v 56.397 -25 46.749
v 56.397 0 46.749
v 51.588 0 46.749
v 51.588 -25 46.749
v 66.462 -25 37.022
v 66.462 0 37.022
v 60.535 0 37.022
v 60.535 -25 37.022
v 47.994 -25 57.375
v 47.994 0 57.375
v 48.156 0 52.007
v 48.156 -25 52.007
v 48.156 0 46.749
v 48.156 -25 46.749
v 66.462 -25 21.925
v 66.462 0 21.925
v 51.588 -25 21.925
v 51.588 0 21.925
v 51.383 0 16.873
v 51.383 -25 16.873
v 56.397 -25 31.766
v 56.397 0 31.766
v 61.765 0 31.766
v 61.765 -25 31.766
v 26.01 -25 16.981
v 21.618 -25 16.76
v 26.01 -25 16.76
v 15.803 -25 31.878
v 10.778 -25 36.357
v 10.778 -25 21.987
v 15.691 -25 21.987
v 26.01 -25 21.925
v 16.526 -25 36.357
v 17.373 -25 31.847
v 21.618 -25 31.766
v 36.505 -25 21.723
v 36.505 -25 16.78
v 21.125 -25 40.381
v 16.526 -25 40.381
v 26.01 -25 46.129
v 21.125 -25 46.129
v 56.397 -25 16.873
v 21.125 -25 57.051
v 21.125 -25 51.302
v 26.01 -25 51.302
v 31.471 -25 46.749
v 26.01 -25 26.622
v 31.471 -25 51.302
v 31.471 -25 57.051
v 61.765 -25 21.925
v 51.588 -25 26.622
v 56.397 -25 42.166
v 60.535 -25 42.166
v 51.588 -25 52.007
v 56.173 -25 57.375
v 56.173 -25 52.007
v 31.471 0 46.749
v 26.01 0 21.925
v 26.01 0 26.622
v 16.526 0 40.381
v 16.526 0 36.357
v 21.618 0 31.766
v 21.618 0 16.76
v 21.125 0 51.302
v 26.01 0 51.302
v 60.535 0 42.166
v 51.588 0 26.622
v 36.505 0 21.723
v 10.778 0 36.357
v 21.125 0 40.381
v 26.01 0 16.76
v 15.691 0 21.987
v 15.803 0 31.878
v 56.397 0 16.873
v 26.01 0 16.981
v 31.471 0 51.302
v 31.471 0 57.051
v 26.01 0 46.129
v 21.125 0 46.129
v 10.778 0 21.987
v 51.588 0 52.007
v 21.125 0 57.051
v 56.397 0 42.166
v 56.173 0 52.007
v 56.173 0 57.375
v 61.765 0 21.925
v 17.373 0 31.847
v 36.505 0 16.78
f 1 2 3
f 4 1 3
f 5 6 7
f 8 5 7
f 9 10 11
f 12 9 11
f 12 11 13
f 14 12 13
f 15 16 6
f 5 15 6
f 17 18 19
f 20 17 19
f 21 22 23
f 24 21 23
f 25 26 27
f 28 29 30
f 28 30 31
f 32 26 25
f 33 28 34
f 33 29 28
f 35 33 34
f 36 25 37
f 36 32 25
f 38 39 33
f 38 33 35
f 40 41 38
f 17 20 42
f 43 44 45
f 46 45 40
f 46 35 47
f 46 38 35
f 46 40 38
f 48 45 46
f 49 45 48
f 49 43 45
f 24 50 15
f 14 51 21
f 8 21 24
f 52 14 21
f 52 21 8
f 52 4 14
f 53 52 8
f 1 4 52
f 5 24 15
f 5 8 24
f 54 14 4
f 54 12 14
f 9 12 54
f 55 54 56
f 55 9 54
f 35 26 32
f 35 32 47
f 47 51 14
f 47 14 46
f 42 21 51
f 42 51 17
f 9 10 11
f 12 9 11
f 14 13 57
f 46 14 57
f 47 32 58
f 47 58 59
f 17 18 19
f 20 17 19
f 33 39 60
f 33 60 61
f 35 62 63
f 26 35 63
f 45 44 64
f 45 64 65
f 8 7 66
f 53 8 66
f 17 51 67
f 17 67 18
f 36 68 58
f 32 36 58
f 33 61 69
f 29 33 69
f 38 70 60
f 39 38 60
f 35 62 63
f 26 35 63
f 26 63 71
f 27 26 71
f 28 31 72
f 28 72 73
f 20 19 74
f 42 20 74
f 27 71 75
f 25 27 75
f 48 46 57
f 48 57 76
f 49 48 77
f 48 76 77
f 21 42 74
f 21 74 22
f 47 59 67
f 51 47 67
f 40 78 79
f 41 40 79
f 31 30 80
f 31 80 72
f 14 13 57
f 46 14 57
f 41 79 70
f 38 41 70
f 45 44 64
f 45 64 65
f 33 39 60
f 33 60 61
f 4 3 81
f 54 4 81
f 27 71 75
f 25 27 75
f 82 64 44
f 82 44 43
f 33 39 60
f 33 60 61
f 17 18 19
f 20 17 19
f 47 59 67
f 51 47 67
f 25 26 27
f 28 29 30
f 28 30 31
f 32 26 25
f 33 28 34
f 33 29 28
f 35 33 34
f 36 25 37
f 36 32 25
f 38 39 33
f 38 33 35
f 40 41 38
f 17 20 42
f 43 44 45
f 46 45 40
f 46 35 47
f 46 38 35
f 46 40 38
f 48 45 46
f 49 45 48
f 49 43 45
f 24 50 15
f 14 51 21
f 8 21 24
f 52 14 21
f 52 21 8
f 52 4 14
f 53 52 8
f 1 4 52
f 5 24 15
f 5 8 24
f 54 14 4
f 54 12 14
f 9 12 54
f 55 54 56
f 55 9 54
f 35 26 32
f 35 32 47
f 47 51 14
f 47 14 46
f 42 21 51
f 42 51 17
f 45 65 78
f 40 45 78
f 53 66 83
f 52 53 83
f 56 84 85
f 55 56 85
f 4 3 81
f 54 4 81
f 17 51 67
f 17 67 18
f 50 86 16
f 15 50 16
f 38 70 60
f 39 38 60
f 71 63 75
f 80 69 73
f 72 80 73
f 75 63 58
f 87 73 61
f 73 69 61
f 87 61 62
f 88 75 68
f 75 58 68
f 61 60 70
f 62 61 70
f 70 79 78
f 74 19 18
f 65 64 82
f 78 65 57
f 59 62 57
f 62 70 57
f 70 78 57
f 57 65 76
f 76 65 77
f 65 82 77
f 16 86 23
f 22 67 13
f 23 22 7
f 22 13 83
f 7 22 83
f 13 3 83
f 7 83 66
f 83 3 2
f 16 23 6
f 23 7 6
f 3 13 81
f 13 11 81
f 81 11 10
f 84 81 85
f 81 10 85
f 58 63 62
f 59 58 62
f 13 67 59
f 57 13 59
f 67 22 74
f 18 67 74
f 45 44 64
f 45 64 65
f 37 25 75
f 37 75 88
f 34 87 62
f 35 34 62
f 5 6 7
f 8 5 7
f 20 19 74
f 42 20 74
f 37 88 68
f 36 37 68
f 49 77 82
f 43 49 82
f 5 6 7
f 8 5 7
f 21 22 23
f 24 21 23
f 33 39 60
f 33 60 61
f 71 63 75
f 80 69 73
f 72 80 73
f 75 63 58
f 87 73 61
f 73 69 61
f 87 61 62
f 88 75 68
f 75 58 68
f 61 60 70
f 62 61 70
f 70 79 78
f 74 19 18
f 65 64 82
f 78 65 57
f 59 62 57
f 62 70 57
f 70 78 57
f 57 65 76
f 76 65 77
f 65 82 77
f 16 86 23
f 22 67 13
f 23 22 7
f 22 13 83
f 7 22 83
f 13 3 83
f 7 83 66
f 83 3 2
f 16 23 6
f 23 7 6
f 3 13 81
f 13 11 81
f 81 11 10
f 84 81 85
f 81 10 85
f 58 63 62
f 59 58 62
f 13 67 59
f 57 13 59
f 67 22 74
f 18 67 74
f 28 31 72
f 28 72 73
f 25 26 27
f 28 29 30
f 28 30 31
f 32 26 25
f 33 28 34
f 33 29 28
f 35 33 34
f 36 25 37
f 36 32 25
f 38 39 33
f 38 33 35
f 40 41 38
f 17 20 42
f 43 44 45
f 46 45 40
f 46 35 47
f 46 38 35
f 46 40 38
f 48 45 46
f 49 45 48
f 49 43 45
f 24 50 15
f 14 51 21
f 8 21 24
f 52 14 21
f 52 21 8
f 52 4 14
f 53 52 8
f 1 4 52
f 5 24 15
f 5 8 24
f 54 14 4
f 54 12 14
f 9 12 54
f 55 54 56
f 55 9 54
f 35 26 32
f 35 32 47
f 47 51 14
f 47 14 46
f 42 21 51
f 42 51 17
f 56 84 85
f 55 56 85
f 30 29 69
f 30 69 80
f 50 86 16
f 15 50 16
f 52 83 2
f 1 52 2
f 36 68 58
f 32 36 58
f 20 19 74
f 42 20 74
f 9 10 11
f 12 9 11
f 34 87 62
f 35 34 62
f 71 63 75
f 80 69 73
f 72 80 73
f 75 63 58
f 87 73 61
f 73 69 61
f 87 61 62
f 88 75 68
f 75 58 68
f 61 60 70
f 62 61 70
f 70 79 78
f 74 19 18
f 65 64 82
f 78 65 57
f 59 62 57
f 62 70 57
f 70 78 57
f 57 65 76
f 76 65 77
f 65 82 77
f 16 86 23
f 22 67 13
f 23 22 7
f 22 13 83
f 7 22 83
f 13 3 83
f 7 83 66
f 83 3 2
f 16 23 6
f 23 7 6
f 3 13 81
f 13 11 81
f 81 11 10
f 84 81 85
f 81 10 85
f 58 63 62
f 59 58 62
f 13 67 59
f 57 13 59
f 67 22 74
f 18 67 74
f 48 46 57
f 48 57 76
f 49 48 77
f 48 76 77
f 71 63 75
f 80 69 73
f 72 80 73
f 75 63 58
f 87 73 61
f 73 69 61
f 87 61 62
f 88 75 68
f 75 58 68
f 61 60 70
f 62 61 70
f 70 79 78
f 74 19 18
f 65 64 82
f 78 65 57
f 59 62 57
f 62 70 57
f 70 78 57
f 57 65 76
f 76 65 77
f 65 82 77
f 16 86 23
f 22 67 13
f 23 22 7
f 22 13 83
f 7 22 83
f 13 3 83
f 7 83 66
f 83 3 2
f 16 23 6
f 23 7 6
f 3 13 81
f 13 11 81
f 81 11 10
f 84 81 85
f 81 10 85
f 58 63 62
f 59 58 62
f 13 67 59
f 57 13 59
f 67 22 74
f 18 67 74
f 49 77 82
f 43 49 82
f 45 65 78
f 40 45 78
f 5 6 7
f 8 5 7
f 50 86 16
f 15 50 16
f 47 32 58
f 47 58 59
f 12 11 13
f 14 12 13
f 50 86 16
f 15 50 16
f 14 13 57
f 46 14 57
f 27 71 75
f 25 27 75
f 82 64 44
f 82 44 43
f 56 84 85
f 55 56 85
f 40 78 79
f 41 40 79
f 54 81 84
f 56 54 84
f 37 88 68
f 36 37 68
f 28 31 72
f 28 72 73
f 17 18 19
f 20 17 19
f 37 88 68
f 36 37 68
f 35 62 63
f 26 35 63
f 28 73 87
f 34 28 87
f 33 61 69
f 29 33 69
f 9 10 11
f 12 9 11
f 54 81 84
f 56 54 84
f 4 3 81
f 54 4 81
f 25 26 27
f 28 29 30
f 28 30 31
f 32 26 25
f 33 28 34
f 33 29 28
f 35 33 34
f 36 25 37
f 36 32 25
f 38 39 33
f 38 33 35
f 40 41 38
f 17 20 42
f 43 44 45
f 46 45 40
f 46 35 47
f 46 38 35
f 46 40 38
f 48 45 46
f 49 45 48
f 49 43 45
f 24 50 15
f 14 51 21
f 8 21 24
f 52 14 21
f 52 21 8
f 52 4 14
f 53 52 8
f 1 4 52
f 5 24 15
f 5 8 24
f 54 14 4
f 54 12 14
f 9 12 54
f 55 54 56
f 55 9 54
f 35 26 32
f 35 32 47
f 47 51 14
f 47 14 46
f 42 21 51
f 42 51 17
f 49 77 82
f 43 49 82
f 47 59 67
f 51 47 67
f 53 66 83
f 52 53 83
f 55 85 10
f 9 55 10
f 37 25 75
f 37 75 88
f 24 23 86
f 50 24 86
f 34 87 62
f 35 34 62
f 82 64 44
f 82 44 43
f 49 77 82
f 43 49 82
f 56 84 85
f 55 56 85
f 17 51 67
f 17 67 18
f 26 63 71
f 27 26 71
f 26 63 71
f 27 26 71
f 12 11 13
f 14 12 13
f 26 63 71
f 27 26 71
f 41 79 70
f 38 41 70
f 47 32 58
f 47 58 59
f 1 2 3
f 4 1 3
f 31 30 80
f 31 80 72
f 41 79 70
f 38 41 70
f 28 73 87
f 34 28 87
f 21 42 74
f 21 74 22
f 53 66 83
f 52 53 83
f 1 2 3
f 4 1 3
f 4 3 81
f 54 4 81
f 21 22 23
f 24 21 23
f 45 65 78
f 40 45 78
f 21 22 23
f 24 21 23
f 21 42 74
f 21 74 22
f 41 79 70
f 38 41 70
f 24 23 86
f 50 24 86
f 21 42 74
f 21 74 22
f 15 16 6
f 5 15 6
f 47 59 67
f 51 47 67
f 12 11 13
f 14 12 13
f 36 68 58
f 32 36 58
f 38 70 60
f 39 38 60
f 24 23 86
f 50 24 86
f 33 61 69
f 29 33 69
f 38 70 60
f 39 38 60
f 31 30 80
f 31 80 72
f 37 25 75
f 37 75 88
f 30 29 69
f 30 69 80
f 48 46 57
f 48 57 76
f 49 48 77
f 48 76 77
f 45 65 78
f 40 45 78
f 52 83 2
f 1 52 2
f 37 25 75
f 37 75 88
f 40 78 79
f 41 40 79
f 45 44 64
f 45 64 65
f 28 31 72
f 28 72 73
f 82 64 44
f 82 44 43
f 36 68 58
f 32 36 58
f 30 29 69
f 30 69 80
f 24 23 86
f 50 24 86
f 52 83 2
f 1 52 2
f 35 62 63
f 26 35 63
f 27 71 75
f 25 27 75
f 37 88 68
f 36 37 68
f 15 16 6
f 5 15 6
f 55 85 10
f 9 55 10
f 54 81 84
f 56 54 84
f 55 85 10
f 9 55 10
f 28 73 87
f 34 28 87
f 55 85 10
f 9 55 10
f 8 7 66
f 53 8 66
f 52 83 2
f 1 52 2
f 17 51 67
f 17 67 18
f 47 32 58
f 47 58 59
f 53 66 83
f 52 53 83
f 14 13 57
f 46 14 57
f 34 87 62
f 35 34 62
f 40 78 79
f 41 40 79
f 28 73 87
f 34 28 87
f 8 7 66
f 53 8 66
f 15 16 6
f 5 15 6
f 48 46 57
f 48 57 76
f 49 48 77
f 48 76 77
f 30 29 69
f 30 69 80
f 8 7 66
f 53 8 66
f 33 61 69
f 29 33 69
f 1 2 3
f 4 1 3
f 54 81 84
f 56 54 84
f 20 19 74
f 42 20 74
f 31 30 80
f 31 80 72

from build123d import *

# Parameters (mm, degrees)
F0_W     = 4.8859491944
F0_H     = 5.7481750846
F0_W_2   = 5.4607708007
F0_W_3   = 4.5850016177
F0_H_2   = 5.367808044
F2_DEPTH = 25
F3_DEPTH = 25
F4_DEPTH = 25
F5_DEPTH = 25


with BuildPart() as f2:
    # F0 (on Front) → F2 (new body)
    with BuildSketch(Plane.XZ):
        Polygon((10.7778282836, 36.3572090864), (10.7778282836, 21.9867695123), (15.6911015511, 21.9867695123), (15.8029310405, 31.8775773048), (17.372814146, 31.8473872064), (21.6180570424, 31.7657478154), (21.6180570424, 21.9247676432), (26.0104928166, 21.9247676432), (26.0104928166, 26.6215987504), (51.5883155167, 26.6215987504), (51.5883155167, 21.9247676432), (56.3969761133, 21.9247676432), (56.3969761133, 31.7657478154), (61.7647841573, 31.7657478154), (61.7647841573, 21.9247676432), (66.4616152644, 21.9247676432), (66.4616152644, 37.0217263699), (61.0938072205, 37.0217263699), (60.5346597731, 37.0217263699), (60.5346597731, 42.1658754349), (56.3969761133, 42.1658754349), (56.3969761133, 46.7486605048), (51.5883155167, 46.7486605048), (51.5883155167, 51.7831966281), (51.5883155167, 52.006855607), (48.1558144093, 52.006855607), (48.1558144093, 46.7486605048), (31.7722000182, 46.7486605048), (31.4712636173, 46.7486605048), (31.4712636173, 51.3024665415), (26.0104928166, 51.3024665415), (26.0104928166, 46.1291074753), (21.1245436221, 46.1291074753), (21.1245436221, 40.380936116), (16.5260042995, 40.380936116), (16.5260042995, 36.3572090864), (11.9274631143, 36.3572090864), align=None)
        Polygon((26.0104928166, 21.9247676432), (21.6180570424, 21.9247676432), (21.6180570424, 21.3656201959), (21.6180570424, 16.7604498565), (26.0104928166, 16.7604498565), (26.0104928166, 16.9814561175), align=None)
        Polygon((36.504591053, 21.7229578032), (26.0104928166, 21.9247676432), (26.0104928166, 16.9814561175), (36.504591053, 16.7796462774), align=None)
        with Locations((23.5675182194, 54.1765540838)):
            Rectangle(F0_W, F0_H)
        with Locations((28.7408782169, 54.1765540838)):
            Rectangle(F0_W_2, F0_H)
        Polygon((56.3969761133, 21.9247676432), (51.5883155167, 21.9247676432), (51.3829626143, 16.872657463), (56.2078505754, 16.872657463), (56.3969761133, 16.872657463), (56.3969761133, 17.3397641629), align=None)
        Polygon((47.9939952493, 57.374663651), (48.1558144093, 52.006855607), (51.5883155167, 52.006855607), (51.5883155167, 57.374663651), align=None)
        with Locations((53.8808163255, 54.690759629)):
            Rectangle(F0_W_3, F0_H_2)
    extrude(amount=F2_DEPTH)


with BuildPart() as f3:
    # F0 (on Front) → F3 (new body)
    with BuildSketch(Plane.XZ):
        Polygon((10.7778282836, 36.3572090864), (10.7778282836, 21.9867695123), (15.6911015511, 21.9867695123), (15.8029310405, 31.8775773048), (17.372814146, 31.8473872064), (21.6180570424, 31.7657478154), (21.6180570424, 21.9247676432), (26.0104928166, 21.9247676432), (26.0104928166, 26.6215987504), (51.5883155167, 26.6215987504), (51.5883155167, 21.9247676432), (56.3969761133, 21.9247676432), (56.3969761133, 31.7657478154), (61.7647841573, 31.7657478154), (61.7647841573, 21.9247676432), (66.4616152644, 21.9247676432), (66.4616152644, 37.0217263699), (61.0938072205, 37.0217263699), (60.5346597731, 37.0217263699), (60.5346597731, 42.1658754349), (56.3969761133, 42.1658754349), (56.3969761133, 46.7486605048), (51.5883155167, 46.7486605048), (51.5883155167, 51.7831966281), (51.5883155167, 52.006855607), (48.1558144093, 52.006855607), (48.1558144093, 46.7486605048), (31.7722000182, 46.7486605048), (31.4712636173, 46.7486605048), (31.4712636173, 51.3024665415), (26.0104928166, 51.3024665415), (26.0104928166, 46.1291074753), (21.1245436221, 46.1291074753), (21.1245436221, 40.380936116), (16.5260042995, 40.380936116), (16.5260042995, 36.3572090864), (11.9274631143, 36.3572090864), align=None)
        Polygon((26.0104928166, 21.9247676432), (21.6180570424, 21.9247676432), (21.6180570424, 21.3656201959), (21.6180570424, 16.7604498565), (26.0104928166, 16.7604498565), (26.0104928166, 16.9814561175), align=None)
        Polygon((36.504591053, 21.7229578032), (26.0104928166, 21.9247676432), (26.0104928166, 16.9814561175), (36.504591053, 16.7796462774), align=None)
        with Locations((23.5675182194, 54.1765540838)):
            Rectangle(F0_W, F0_H)
        with Locations((28.7408782169, 54.1765540838)):
            Rectangle(F0_W_2, F0_H)
        Polygon((56.3969761133, 21.9247676432), (51.5883155167, 21.9247676432), (51.3829626143, 16.872657463), (56.2078505754, 16.872657463), (56.3969761133, 16.872657463), (56.3969761133, 17.3397641629), align=None)
        Polygon((47.9939952493, 57.374663651), (48.1558144093, 52.006855607), (51.5883155167, 52.006855607), (51.5883155167, 57.374663651), align=None)
        with Locations((53.8808163255, 54.690759629)):
            Rectangle(F0_W_3, F0_H_2)
    extrude(amount=F3_DEPTH)


with BuildPart() as f4:
    # F0 (on Front) → F4 (new body)
    with BuildSketch(Plane.XZ):
        Polygon((10.7778282836, 36.3572090864), (10.7778282836, 21.9867695123), (15.6911015511, 21.9867695123), (15.8029310405, 31.8775773048), (17.372814146, 31.8473872064), (21.6180570424, 31.7657478154), (21.6180570424, 21.9247676432), (26.0104928166, 21.9247676432), (26.0104928166, 26.6215987504), (51.5883155167, 26.6215987504), (51.5883155167, 21.9247676432), (56.3969761133, 21.9247676432), (56.3969761133, 31.7657478154), (61.7647841573, 31.7657478154), (61.7647841573, 21.9247676432), (66.4616152644, 21.9247676432), (66.4616152644, 37.0217263699), (61.0938072205, 37.0217263699), (60.5346597731, 37.0217263699), (60.5346597731, 42.1658754349), (56.3969761133, 42.1658754349), (56.3969761133, 46.7486605048), (51.5883155167, 46.7486605048), (51.5883155167, 51.7831966281), (51.5883155167, 52.006855607), (48.1558144093, 52.006855607), (48.1558144093, 46.7486605048), (31.7722000182, 46.7486605048), (31.4712636173, 46.7486605048), (31.4712636173, 51.3024665415), (26.0104928166, 51.3024665415), (26.0104928166, 46.1291074753), (21.1245436221, 46.1291074753), (21.1245436221, 40.380936116), (16.5260042995, 40.380936116), (16.5260042995, 36.3572090864), (11.9274631143, 36.3572090864), align=None)
        Polygon((26.0104928166, 21.9247676432), (21.6180570424, 21.9247676432), (21.6180570424, 21.3656201959), (21.6180570424, 16.7604498565), (26.0104928166, 16.7604498565), (26.0104928166, 16.9814561175), align=None)
        Polygon((36.504591053, 21.7229578032), (26.0104928166, 21.9247676432), (26.0104928166, 16.9814561175), (36.504591053, 16.7796462774), align=None)
        with Locations((23.5675182194, 54.1765540838)):
            Rectangle(F0_W, F0_H)
        with Locations((28.7408782169, 54.1765540838)):
            Rectangle(F0_W_2, F0_H)
        Polygon((56.3969761133, 21.9247676432), (51.5883155167, 21.9247676432), (51.3829626143, 16.872657463), (56.2078505754, 16.872657463), (56.3969761133, 16.872657463), (56.3969761133, 17.3397641629), align=None)
        Polygon((47.9939952493, 57.374663651), (48.1558144093, 52.006855607), (51.5883155167, 52.006855607), (51.5883155167, 57.374663651), align=None)
        with Locations((53.8808163255, 54.690759629)):
            Rectangle(F0_W_3, F0_H_2)
    extrude(amount=F4_DEPTH)


with BuildPart() as f5:
    # F0 (on Front) → F5 (new body)
    with BuildSketch(Plane.XZ):
        Polygon((10.7778282836, 36.3572090864), (10.7778282836, 21.9867695123), (15.6911015511, 21.9867695123), (15.8029310405, 31.8775773048), (17.372814146, 31.8473872064), (21.6180570424, 31.7657478154), (21.6180570424, 21.9247676432), (26.0104928166, 21.9247676432), (26.0104928166, 26.6215987504), (51.5883155167, 26.6215987504), (51.5883155167, 21.9247676432), (56.3969761133, 21.9247676432), (56.3969761133, 31.7657478154), (61.7647841573, 31.7657478154), (61.7647841573, 21.9247676432), (66.4616152644, 21.9247676432), (66.4616152644, 37.0217263699), (61.0938072205, 37.0217263699), (60.5346597731, 37.0217263699), (60.5346597731, 42.1658754349), (56.3969761133, 42.1658754349), (56.3969761133, 46.7486605048), (51.5883155167, 46.7486605048), (51.5883155167, 51.7831966281), (51.5883155167, 52.006855607), (48.1558144093, 52.006855607), (48.1558144093, 46.7486605048), (31.7722000182, 46.7486605048), (31.4712636173, 46.7486605048), (31.4712636173, 51.3024665415), (26.0104928166, 51.3024665415), (26.0104928166, 46.1291074753), (21.1245436221, 46.1291074753), (21.1245436221, 40.380936116), (16.5260042995, 40.380936116), (16.5260042995, 36.3572090864), (11.9274631143, 36.3572090864), align=None)
        Polygon((26.0104928166, 21.9247676432), (21.6180570424, 21.9247676432), (21.6180570424, 21.3656201959), (21.6180570424, 16.7604498565), (26.0104928166, 16.7604498565), (26.0104928166, 16.9814561175), align=None)
        Polygon((36.504591053, 21.7229578032), (26.0104928166, 21.9247676432), (26.0104928166, 16.9814561175), (36.504591053, 16.7796462774), align=None)
        with Locations((23.5675182194, 54.1765540838)):
            Rectangle(F0_W, F0_H)
        with Locations((28.7408782169, 54.1765540838)):
            Rectangle(F0_W_2, F0_H)
        Polygon((56.3969761133, 21.9247676432), (51.5883155167, 21.9247676432), (51.3829626143, 16.872657463), (56.2078505754, 16.872657463), (56.3969761133, 16.872657463), (56.3969761133, 17.3397641629), align=None)
        Polygon((47.9939952493, 57.374663651), (48.1558144093, 52.006855607), (51.5883155167, 52.006855607), (51.5883155167, 57.374663651), align=None)
        with Locations((53.8808163255, 54.690759629)):
            Rectangle(F0_W_3, F0_H_2)
    extrude(amount=F5_DEPTH)


solid = Compound([f2.part, f3.part, f4.part, f5.part])
